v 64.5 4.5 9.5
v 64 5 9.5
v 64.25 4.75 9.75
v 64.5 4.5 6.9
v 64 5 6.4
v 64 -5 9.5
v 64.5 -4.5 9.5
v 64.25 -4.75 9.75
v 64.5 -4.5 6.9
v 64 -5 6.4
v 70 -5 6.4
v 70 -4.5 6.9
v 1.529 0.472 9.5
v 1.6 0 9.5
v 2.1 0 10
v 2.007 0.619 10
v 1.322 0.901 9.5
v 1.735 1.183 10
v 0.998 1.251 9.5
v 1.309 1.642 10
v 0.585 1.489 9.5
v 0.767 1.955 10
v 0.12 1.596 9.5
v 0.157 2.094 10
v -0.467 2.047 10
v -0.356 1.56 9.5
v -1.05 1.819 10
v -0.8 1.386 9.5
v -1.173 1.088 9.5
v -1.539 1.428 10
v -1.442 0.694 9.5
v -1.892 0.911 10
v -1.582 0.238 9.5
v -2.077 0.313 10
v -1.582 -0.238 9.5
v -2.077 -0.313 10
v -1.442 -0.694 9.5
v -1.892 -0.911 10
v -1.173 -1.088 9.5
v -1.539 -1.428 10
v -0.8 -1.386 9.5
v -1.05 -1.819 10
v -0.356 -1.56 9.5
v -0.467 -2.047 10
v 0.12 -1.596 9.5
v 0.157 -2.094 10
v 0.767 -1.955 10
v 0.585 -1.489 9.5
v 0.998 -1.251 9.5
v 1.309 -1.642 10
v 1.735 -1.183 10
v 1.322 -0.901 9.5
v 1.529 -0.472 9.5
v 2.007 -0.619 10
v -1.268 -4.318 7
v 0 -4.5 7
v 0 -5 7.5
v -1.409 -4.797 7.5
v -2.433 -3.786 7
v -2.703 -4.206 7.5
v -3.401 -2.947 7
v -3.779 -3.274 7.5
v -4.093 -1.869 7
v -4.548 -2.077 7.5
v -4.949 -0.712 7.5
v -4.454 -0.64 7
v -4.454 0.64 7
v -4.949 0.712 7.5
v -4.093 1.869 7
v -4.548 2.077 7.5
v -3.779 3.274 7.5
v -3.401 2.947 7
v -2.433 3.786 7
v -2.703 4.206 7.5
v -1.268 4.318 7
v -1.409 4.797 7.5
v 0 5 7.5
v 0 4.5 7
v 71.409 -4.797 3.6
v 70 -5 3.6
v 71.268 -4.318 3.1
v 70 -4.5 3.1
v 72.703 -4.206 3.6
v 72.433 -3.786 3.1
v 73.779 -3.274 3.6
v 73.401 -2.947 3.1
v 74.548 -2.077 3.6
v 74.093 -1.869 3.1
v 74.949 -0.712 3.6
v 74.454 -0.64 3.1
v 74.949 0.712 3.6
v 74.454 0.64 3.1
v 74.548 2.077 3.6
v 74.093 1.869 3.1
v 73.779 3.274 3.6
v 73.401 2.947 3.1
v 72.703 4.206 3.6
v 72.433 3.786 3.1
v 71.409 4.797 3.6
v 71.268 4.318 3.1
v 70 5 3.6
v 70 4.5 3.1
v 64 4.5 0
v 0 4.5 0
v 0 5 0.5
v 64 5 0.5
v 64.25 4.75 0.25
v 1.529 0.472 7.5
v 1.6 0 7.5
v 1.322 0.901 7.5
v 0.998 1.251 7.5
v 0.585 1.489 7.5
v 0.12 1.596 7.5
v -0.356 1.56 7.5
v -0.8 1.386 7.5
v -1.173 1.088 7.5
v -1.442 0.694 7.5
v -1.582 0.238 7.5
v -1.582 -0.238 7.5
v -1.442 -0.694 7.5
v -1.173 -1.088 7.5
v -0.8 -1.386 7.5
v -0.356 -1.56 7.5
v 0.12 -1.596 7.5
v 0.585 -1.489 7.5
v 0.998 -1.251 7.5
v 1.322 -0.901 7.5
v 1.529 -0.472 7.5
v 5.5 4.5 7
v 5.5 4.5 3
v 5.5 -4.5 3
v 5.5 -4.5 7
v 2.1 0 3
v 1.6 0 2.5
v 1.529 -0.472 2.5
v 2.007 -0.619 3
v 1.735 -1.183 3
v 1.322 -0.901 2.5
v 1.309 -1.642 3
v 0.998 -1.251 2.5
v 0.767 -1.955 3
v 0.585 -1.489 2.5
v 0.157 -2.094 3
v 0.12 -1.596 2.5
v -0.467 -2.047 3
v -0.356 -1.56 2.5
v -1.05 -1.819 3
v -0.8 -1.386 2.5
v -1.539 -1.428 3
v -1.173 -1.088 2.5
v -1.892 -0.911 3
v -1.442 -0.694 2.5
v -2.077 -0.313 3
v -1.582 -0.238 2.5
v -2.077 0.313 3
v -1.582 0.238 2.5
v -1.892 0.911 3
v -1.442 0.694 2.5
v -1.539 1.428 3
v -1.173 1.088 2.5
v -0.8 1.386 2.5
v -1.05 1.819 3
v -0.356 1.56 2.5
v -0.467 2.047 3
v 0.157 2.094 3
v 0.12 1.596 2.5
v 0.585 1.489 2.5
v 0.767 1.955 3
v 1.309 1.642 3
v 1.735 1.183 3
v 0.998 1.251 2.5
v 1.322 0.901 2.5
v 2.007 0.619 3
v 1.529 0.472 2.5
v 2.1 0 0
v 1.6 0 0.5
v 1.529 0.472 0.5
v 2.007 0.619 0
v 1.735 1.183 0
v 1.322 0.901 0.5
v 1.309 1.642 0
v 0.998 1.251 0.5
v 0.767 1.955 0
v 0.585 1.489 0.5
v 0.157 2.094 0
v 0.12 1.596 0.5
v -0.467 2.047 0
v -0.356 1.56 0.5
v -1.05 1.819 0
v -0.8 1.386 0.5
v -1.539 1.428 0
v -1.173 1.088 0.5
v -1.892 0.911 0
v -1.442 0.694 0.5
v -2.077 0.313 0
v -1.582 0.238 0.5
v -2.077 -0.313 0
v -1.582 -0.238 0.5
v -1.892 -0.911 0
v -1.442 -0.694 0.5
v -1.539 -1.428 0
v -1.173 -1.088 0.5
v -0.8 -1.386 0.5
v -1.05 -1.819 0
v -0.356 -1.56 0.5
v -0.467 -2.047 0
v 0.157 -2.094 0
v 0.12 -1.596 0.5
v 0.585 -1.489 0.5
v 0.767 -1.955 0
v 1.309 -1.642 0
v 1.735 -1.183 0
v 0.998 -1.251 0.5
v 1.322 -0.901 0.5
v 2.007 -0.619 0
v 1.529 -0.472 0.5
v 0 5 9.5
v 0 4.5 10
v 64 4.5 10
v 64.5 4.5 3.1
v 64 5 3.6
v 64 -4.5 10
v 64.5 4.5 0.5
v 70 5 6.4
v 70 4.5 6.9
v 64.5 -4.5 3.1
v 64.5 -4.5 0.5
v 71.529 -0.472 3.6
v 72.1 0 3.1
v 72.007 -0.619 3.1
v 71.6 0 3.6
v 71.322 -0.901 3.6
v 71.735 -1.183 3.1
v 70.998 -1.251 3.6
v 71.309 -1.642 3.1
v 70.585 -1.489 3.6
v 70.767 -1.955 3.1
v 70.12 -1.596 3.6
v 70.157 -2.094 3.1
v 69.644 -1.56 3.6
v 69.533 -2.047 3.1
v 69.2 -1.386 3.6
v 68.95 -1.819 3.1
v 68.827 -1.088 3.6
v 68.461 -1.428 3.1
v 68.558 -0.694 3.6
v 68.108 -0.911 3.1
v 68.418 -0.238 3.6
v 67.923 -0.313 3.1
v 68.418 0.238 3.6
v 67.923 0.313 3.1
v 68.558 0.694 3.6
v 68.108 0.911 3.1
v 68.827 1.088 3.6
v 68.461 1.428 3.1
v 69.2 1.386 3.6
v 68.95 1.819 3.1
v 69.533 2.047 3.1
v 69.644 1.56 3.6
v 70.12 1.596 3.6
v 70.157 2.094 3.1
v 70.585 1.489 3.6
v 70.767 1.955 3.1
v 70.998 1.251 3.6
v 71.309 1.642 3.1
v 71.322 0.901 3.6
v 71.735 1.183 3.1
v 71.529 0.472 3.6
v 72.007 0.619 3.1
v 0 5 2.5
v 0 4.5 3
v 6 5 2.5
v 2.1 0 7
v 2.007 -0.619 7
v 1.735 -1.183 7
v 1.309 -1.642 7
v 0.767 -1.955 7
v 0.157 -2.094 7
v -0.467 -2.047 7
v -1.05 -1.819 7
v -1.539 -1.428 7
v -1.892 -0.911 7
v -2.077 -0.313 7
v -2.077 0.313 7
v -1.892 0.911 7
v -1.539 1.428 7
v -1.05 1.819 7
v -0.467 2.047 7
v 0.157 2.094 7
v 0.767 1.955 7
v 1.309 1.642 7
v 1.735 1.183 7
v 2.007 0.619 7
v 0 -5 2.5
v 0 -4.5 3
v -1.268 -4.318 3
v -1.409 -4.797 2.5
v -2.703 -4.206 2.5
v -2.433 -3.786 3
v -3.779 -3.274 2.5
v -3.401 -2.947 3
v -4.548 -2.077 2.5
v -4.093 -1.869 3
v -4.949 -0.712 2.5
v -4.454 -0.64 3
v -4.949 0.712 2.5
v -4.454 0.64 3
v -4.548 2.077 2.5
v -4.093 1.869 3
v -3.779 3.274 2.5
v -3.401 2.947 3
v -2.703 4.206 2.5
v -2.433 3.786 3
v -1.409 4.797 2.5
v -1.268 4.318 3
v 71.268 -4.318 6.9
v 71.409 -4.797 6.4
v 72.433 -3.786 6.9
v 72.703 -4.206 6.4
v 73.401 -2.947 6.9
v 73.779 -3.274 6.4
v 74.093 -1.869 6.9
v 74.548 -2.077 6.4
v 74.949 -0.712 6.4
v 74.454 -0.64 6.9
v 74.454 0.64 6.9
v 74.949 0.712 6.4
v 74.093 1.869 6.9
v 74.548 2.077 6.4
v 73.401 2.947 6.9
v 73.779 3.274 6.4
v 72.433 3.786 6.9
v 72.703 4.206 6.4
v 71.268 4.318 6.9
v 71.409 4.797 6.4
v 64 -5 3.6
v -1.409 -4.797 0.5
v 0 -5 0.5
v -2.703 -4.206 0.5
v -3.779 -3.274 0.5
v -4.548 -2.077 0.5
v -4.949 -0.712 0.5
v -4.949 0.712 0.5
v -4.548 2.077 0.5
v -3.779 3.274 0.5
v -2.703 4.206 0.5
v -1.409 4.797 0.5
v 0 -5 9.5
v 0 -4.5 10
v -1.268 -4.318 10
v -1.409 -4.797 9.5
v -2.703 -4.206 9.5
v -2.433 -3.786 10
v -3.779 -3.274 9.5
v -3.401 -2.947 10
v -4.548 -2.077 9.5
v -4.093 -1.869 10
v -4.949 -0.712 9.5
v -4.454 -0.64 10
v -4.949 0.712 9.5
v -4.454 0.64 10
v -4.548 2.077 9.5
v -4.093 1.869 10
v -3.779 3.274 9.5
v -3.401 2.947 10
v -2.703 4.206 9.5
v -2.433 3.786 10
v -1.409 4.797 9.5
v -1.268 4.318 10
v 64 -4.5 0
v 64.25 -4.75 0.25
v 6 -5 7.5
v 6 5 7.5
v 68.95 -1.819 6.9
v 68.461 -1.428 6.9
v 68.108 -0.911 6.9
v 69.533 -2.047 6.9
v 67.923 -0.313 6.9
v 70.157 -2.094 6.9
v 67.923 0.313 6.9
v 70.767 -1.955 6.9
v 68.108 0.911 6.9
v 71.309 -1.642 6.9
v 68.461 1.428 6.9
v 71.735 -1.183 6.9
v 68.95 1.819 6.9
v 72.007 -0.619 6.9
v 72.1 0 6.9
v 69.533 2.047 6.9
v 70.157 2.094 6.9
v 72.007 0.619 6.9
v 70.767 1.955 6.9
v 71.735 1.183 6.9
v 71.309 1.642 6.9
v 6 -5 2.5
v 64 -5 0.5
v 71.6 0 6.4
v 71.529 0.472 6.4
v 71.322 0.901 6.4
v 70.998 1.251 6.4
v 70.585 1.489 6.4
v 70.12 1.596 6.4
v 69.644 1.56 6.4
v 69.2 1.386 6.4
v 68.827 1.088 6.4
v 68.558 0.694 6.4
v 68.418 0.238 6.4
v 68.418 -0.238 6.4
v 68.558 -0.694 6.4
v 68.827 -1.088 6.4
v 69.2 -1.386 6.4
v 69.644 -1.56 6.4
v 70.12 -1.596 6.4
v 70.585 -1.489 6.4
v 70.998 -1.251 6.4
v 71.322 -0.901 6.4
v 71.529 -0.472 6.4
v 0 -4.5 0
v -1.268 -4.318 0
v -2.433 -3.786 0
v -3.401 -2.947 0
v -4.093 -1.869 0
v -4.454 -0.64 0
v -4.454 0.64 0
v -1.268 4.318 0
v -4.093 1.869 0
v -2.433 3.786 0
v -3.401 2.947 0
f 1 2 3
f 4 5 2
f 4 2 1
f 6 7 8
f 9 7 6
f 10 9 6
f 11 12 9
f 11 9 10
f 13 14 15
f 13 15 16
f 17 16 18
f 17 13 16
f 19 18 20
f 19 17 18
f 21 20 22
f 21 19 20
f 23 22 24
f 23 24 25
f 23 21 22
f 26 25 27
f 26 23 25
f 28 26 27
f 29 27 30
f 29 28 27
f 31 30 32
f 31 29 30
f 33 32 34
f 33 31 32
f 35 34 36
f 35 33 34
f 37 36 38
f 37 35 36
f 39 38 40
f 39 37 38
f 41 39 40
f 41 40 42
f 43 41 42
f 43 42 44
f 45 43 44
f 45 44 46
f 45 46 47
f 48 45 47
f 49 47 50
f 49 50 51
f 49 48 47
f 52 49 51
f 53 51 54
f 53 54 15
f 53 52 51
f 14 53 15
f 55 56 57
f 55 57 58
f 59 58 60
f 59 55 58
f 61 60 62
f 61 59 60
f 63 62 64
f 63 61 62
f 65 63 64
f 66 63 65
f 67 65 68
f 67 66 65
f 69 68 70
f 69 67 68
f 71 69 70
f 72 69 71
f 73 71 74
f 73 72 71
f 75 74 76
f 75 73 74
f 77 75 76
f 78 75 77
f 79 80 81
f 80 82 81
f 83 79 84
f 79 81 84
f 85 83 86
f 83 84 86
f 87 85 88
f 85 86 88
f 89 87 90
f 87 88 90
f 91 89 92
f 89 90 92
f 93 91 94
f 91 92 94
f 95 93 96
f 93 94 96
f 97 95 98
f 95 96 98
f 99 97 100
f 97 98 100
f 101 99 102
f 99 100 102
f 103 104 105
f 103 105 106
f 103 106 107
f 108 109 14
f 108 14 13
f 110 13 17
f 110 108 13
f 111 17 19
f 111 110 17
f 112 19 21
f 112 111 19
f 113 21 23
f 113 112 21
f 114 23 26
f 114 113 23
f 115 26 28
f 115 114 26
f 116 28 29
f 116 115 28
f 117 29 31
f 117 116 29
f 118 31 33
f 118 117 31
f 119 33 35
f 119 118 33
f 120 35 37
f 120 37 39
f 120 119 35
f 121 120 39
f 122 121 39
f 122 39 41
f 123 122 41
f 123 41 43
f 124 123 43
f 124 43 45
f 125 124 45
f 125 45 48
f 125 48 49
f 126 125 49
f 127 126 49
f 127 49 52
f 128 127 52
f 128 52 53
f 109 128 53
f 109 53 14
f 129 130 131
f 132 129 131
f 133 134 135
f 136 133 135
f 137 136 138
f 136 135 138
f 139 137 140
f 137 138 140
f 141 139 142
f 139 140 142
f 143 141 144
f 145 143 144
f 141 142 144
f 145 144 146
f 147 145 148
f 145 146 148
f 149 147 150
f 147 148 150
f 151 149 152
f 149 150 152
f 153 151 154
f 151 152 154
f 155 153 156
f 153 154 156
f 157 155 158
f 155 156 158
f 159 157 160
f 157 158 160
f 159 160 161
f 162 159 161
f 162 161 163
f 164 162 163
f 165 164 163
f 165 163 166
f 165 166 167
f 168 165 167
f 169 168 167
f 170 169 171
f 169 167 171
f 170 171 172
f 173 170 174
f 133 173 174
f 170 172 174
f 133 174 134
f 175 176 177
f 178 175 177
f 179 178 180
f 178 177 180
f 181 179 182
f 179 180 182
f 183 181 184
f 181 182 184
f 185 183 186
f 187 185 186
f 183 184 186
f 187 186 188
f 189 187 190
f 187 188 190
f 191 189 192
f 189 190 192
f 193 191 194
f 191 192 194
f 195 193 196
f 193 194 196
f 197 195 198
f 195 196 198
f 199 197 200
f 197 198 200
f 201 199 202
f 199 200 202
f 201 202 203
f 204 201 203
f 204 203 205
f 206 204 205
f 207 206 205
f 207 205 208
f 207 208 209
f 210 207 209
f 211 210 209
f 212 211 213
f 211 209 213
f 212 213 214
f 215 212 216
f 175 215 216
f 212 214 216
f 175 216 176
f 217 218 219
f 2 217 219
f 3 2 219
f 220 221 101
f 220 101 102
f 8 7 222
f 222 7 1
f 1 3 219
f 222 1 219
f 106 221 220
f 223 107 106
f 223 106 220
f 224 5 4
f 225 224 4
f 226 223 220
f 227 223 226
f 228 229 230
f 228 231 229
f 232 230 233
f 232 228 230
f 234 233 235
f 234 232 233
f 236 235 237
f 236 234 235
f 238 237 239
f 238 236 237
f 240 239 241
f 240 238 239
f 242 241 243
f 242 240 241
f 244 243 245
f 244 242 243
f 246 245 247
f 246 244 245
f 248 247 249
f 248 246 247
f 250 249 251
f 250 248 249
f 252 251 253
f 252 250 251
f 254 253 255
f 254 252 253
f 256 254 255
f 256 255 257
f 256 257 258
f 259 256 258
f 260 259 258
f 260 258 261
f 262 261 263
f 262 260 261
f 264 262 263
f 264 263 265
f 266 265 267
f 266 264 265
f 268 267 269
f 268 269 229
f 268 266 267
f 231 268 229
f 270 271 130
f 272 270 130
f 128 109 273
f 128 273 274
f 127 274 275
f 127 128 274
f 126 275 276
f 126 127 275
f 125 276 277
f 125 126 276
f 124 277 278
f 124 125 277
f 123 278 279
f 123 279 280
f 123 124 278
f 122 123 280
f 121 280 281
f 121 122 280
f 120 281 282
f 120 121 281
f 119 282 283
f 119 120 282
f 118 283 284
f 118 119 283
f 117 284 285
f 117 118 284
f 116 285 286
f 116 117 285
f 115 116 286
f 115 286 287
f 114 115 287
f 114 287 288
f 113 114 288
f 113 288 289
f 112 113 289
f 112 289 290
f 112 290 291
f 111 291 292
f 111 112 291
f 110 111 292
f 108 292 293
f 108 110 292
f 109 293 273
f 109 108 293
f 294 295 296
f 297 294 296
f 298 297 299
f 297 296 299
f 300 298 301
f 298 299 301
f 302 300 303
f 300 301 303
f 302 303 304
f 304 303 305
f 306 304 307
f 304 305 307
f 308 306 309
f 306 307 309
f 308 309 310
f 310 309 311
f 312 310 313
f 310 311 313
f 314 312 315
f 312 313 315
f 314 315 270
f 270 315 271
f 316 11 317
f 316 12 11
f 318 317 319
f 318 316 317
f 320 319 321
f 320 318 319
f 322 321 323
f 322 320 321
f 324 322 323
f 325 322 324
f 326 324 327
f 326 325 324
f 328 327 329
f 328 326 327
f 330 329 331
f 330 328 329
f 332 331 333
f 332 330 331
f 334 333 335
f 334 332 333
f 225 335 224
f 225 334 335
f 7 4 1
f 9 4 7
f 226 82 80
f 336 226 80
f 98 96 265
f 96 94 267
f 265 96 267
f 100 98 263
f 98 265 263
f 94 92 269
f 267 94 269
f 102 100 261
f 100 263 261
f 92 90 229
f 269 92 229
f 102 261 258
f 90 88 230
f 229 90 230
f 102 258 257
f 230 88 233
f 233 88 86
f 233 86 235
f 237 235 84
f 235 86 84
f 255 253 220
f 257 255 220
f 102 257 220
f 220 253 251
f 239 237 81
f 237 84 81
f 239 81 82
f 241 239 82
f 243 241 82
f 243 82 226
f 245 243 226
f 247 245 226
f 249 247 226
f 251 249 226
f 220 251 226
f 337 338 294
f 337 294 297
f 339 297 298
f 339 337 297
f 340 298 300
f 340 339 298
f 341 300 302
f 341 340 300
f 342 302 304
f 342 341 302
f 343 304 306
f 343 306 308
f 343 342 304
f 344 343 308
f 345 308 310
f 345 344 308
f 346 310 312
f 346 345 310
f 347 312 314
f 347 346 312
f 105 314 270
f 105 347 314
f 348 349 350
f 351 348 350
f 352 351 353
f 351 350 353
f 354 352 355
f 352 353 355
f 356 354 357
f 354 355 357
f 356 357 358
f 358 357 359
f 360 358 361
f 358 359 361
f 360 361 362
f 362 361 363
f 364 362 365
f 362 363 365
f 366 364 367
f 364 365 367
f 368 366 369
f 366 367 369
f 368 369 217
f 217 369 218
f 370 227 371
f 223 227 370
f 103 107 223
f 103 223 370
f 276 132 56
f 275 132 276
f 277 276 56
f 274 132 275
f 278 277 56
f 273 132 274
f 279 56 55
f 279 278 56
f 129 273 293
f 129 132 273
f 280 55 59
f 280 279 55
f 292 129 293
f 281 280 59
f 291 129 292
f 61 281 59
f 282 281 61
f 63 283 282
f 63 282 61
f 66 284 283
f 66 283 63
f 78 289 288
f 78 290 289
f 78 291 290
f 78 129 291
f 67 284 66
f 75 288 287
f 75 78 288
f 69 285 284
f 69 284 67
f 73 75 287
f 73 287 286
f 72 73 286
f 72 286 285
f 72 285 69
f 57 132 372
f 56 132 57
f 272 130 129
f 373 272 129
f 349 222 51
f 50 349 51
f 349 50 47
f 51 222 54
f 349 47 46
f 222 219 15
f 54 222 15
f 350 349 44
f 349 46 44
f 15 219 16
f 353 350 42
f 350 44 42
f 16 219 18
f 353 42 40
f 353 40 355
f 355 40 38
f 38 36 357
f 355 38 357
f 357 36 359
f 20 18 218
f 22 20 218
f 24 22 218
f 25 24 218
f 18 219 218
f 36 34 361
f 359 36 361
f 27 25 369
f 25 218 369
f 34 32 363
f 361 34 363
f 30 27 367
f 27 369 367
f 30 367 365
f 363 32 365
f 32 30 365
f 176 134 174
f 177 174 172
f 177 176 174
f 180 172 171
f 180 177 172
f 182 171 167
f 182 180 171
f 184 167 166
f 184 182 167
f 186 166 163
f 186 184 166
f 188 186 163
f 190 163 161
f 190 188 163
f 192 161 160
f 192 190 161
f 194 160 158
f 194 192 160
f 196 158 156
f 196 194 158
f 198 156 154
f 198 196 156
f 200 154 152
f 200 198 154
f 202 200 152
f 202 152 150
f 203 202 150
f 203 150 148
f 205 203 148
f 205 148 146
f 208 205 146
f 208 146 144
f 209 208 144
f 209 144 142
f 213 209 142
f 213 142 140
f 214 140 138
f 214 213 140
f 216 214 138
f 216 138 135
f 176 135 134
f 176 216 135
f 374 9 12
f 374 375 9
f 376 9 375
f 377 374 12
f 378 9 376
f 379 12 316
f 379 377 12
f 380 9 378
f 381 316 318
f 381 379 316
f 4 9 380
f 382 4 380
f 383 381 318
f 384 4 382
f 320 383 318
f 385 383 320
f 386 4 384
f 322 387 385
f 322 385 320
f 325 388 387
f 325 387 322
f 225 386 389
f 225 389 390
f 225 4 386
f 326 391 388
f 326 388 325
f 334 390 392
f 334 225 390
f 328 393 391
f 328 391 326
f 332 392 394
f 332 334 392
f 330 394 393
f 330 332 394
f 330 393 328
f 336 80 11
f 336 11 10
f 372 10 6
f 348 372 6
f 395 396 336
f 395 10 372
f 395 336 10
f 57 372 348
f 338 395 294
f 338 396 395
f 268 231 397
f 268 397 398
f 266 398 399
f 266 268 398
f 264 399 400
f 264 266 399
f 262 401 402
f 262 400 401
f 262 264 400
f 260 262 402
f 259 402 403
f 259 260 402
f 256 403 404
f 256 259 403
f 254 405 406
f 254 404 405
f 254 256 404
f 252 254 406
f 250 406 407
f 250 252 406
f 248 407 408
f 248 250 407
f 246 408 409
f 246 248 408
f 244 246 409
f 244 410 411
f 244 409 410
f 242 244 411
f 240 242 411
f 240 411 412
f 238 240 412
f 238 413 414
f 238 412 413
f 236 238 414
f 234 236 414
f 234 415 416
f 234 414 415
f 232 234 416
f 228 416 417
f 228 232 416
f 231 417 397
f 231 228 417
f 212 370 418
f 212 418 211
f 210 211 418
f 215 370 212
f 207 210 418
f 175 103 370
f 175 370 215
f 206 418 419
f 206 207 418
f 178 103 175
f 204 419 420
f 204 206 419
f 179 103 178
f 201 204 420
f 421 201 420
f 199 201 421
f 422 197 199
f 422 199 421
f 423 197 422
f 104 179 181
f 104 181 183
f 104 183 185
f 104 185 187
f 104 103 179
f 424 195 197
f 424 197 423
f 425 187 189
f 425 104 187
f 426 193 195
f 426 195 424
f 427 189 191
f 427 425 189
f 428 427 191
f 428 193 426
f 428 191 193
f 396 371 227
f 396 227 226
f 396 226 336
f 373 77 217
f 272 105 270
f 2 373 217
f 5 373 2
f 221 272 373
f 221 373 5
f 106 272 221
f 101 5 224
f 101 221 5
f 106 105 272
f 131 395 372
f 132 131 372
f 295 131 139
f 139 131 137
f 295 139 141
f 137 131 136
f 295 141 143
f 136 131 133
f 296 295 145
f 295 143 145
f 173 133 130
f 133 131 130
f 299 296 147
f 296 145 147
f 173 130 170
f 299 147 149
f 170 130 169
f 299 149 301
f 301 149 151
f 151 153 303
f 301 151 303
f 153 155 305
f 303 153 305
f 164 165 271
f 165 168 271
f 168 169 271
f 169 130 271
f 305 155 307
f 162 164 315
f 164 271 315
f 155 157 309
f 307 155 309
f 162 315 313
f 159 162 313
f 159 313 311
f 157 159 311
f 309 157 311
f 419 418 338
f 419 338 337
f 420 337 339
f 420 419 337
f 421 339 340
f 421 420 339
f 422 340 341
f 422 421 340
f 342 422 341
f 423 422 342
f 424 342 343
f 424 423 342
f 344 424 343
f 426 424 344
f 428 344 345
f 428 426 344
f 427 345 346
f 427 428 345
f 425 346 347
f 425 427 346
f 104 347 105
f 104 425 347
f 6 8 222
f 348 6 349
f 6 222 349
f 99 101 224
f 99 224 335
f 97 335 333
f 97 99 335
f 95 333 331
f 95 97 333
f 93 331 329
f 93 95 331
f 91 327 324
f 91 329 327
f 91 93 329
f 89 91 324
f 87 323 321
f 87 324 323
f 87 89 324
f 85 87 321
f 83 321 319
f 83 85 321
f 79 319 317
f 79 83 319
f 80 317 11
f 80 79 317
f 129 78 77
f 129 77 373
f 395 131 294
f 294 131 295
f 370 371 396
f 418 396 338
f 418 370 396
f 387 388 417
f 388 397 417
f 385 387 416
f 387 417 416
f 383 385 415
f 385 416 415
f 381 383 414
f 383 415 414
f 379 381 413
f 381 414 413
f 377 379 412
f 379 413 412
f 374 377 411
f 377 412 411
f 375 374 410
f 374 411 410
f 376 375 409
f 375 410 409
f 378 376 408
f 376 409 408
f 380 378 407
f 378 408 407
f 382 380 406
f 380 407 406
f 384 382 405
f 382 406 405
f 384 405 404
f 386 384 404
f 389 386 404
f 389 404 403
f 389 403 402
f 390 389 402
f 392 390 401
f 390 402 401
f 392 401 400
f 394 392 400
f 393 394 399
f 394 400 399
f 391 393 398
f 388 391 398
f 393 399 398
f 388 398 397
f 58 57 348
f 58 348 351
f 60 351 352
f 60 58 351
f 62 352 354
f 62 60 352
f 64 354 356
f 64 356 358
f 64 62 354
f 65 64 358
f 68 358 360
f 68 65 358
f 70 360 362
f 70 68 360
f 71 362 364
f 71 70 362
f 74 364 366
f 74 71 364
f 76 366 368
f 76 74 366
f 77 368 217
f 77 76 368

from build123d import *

# Parameters (mm, degrees)
SKETCH1_R           = 1.6
BOSS_EXTRUDE1_DEPTH = 10
CUT_EXTRUDE1_START  = -7
CUT_EXTRUDE1_DEPTH  = 4
CHAMFER1_SIZE       = 0.5
CUT_EXTRUDE2_START  = -3.1
CUT_EXTRUDE2_DEPTH  = 3.1
CUT_EXTRUDE3_START  = -6.9
CUT_EXTRUDE3_DEPTH  = 3.1
CHAMFER2_SIZE       = 0.5


with BuildPart() as part:
    # Sketch1 → Boss-Extrude1 (new body)
    with BuildSketch(Plane.XY):
        with BuildLine():
            Line((0, 5), (70, 5))
            ThreePointArc((70, 5), (75, 0), (70, -5))
            Line((70, -5), (0, -5))
            ThreePointArc((0, -5), (-5, 0), (0, 5))
        make_face()
        Circle(SKETCH1_R, mode=Mode.SUBTRACT)
        with Locations((70, 0)):
            Circle(SKETCH1_R, mode=Mode.SUBTRACT)
    extrude(amount=BOSS_EXTRUDE1_DEPTH)

    # Sketch2 → Cut-Extrude1 (cut)
    with BuildSketch(Plane.XY.offset(10).offset(CUT_EXTRUDE1_START)):
        with BuildLine():
            Line((5.5, 5), (5.5, -5))
            Line((5.5, -5), (0, -5))
            ThreePointArc((0, -5), (-5, 0), (0, 5))
            Line((0, 5), (5.5, 5))
        make_face()
    extrude(amount=CUT_EXTRUDE1_DEPTH, mode=Mode.SUBTRACT)

    # Chamfer1
    chamfer1_edges = [part.edges().sort_by_distance(p)[0] for p in [
        (75, 0, 10),
        (-1.6, 0, 0),
        (-1.6, 0, 10),
        (35, 5, 10),
        (68.4, 0, 0),
        (68.4, 0, 10),
        (-1.6, 0, 3),
        (2.75, 5, 3),
        (5.5, 5, 5),
        (2.75, -5, 3),
        (5.5, -5, 5),
        (-5, 0, 3),
        (-1.6, 0, 7),
        (2.75, 5, 7),
        (-5, 0, 7),
        (2.75, -5, 7),
        (-5, 0, 10),
        (35, 5, 0),
        (75, 0, 0),
        (35, -5, 0),
        (-5, 0, 0),
        (35, -5, 10),
    ]]
    chamfer(chamfer1_edges, length=CHAMFER1_SIZE)

    # Sketch3 → Cut-Extrude2 (cut)
    with BuildSketch(Plane.XY.offset(10).offset(CUT_EXTRUDE2_START)):
        with BuildLine():
            Line((64.5, 5), (64.5, -5))
            Line((64.5, -5), (70, -5))
            ThreePointArc((70, -5), (75, 0), (70, 5))
            Line((70, 5), (64.5, 5))
        make_face()
    extrude(amount=CUT_EXTRUDE2_DEPTH, mode=Mode.SUBTRACT)

    # Sketch4 → Cut-Extrude3 (cut)
    with BuildSketch(Plane.XY.offset(6.9).offset(CUT_EXTRUDE3_START)):
        with BuildLine():
            Line((64.5, 5), (64.5, -5))
            Line((64.5, -5), (70, -5))
            ThreePointArc((70, -5), (75, 0), (70, 5))
            Line((70, 5), (64.5, 5))
        make_face()
    extrude(amount=CUT_EXTRUDE3_DEPTH, mode=Mode.SUBTRACT)

    # Chamfer2
    # the kernel refuses this chamfer: 0.5 mm, written as the material it takes off along each edge
    with BuildSketch(Plane(origin=(70, 0, 6.9), x_dir=(1, 0, 0), z_dir=(0, 1, 0))) as chamfer2_piece_1:
        Polygon((1.6 + CHAMFER2_SIZE, 0), (1.6, CHAMFER2_SIZE), (1.6, 0), align=None)
    revolve(axis=Axis((70, 0, 6.9), (0, 0, -1)), mode=Mode.SUBTRACT)
    with BuildSketch(Plane(origin=(70, 0, 3.1), x_dir=(1, 0, 0), z_dir=(0, 1, 0))) as chamfer2_piece_2:
        Polygon((1.6 + CHAMFER2_SIZE, 0), (1.6, -CHAMFER2_SIZE), (1.6, 0), align=None)
    revolve(axis=Axis((70, 0, 3.1), (0, 0, -1)), mode=Mode.SUBTRACT)
    with BuildSketch(Plane(origin=(64.5, -5, -0.785841494), x_dir=(0.0274958766105822, 0.999621916911297, 0), z_dir=(0, 0, 1)), Plane(origin=(64.5, 5, -0.785841494), x_dir=(-0.9996219169112968, 0.02749587661058574, 0), z_dir=(0, 0, 1)), Plane(origin=(64.5, -5, 6.9), x_dir=(0.0274958766105822, 0.999621916911297, 0), z_dir=(0, 0, 1)), Plane(origin=(64.5, 5, 6.9), x_dir=(-0.9996219169112973, 0.027495876610566763, 0), z_dir=(0, 0, 1))) as chamfer2_piece_3:
        Polygon((CHAMFER2_SIZE * 0.999621916911, CHAMFER2_SIZE * 0.0274958766106), (-CHAMFER2_SIZE * 0.0274958766106, CHAMFER2_SIZE * 0.999621916911), (0, 0), align=None)
    extrude(amount=3.885841494, mode=Mode.SUBTRACT)
    with BuildSketch(Plane(origin=(64.5, 5.785841494, 0), x_dir=(0.027495876610582174, 0, 0.9996219169112968), z_dir=(0, -1, 0))) as chamfer2_piece_4:
        Polygon((CHAMFER2_SIZE * 0.999621916911, CHAMFER2_SIZE * 0.0274958766106), (-CHAMFER2_SIZE * 0.0274958766106, CHAMFER2_SIZE * 0.999621916911), (0, 0), align=None)
    extrude(amount=11.571682988, mode=Mode.SUBTRACT)
    with BuildSketch(Plane(origin=(64.5, -5, 3.1), x_dir=(0, 0.9996219169112968, -0.027495876610586462), z_dir=(1, 0, 0)), Plane(origin=(70, 5, 6.9), x_dir=(0, 0.027495876610585647, -0.9996219169112968), z_dir=(-1, 0, 0))) as chamfer2_piece_5:
        Polygon((CHAMFER2_SIZE * 0.999621916911, CHAMFER2_SIZE * 0.0274958766106), (-CHAMFER2_SIZE * 0.0274958766106, CHAMFER2_SIZE * 0.999621916911), (0, 0), align=None)
    extrude(amount=5.5, mode=Mode.SUBTRACT)
    with BuildSketch(Plane(origin=(70, 0, 3.1), x_dir=(0, -1, 0), z_dir=(-1, 0, 0))) as chamfer2_piece_6:
        Polygon((5, CHAMFER2_SIZE), (5 - CHAMFER2_SIZE, 0), (5, 0), align=None)
    revolve(axis=Axis((70, 0, 3.1), (0, 0, 1)), revolution_arc=180, mode=Mode.SUBTRACT)
    with BuildSketch(Plane(origin=(70, 5, 3.1), x_dir=(0, 0.027495876610585623, 0.9996219169112968), z_dir=(-1, 0, 0)), Plane(origin=(64.5, -5, 6.9), x_dir=(0, 0.9996219169112968, 0.0274958766105856), z_dir=(1, 0, 0))) as chamfer2_piece_7:
        Polygon((CHAMFER2_SIZE * 0.999621916911, -CHAMFER2_SIZE * 0.0274958766106), (-CHAMFER2_SIZE * 0.0274958766106, -CHAMFER2_SIZE * 0.999621916911), (0, 0), align=None)
    extrude(amount=5.5, mode=Mode.SUBTRACT)
    with BuildSketch(Plane(origin=(64.5, 5.785841494, 10), x_dir=(0.0274958766105822, 0, -0.999621916911297), z_dir=(0, -1, 0))) as chamfer2_piece_8:
        Polygon((CHAMFER2_SIZE * 0.999621916911, -CHAMFER2_SIZE * 0.0274958766106), (-CHAMFER2_SIZE * 0.0274958766106, -CHAMFER2_SIZE * 0.999621916911), (0, 0), align=None)
    extrude(amount=11.571682988, mode=Mode.SUBTRACT)
    with BuildSketch(Plane(origin=(70, 0, 6.9), x_dir=(0, -1, 0), z_dir=(-1, 0, 0))) as chamfer2_piece_9:
        Polygon((5, -CHAMFER2_SIZE), (5 - CHAMFER2_SIZE, 0), (5, 0), align=None)
    revolve(axis=Axis((70, 0, 6.9), (0, 0, 1)), revolution_arc=180, mode=Mode.SUBTRACT)
    with BuildSketch(Plane(origin=(64.5, -5, -0.785841494), x_dir=(0.0274958766105822, 0.999621916911297, 0), z_dir=(0, 0, 1))) as chamfer2_piece_10a_section:
        Polygon((CHAMFER2_SIZE * 0.999621916911, CHAMFER2_SIZE * 0.0274958766106), (-CHAMFER2_SIZE * 0.0274958766106, CHAMFER2_SIZE * 0.999621916911), (0, 0), align=None)
    chamfer2_piece_10a = extrude(amount=5.171682988, mode=Mode.PRIVATE)
    chamfer2_piece_10a = split(chamfer2_piece_10a, bisect_by=Plane(origin=(64.335103187, -4.835103187, 3.1), z_dir=(0, 0, 1)), keep=Keep.TOP, mode=Mode.PRIVATE)
    with BuildSketch(Plane(origin=(63.214158506, -5, 3.1), x_dir=(0, 0.9996219169112968, -0.02749587661058651), z_dir=(1, 0, 0))) as chamfer2_piece_10b_section:
        Polygon((CHAMFER2_SIZE * 0.999621916911, CHAMFER2_SIZE * 0.0274958766106), (-CHAMFER2_SIZE * 0.0274958766106, CHAMFER2_SIZE * 0.999621916911), (0, 0), align=None)
    chamfer2_piece_10b = extrude(amount=6.785841494, mode=Mode.PRIVATE)
    chamfer2_piece_10b = split(chamfer2_piece_10b, bisect_by=Plane(origin=(64.5, -4.835103187, 3.264896813), z_dir=(-1, 0, 0)), keep=Keep.TOP, mode=Mode.PRIVATE)
    chamfer2_piece_10 = chamfer2_piece_10a & chamfer2_piece_10b
    add(chamfer2_piece_10, mode=Mode.SUBTRACT)
    with BuildSketch(Plane(origin=(64.5, 5, -0.785841494), x_dir=(-0.9996219169112968, 0.02749587661058574, 0), z_dir=(0, 0, 1))) as chamfer2_piece_11a_section:
        Polygon((CHAMFER2_SIZE * 0.999621916911, CHAMFER2_SIZE * 0.0274958766106), (-CHAMFER2_SIZE * 0.0274958766106, CHAMFER2_SIZE * 0.999621916911), (0, 0), align=None)
    chamfer2_piece_11a = extrude(amount=5.171682988, mode=Mode.PRIVATE)
    chamfer2_piece_11a = split(chamfer2_piece_11a, bisect_by=Plane(origin=(64.335103187, 4.835103187, 3.1), z_dir=(0, 0, 1)), keep=Keep.TOP, mode=Mode.PRIVATE)
    with BuildSketch(Plane(origin=(70, 5, 3.1), x_dir=(0, 0.027495876610585623, 0.9996219169112968), z_dir=(-1, 0, 0))) as chamfer2_piece_11b_section:
        Polygon((CHAMFER2_SIZE * 0.999621916911, -CHAMFER2_SIZE * 0.0274958766106), (-CHAMFER2_SIZE * 0.0274958766106, -CHAMFER2_SIZE * 0.999621916911), (0, 0), align=None)
    chamfer2_piece_11b = extrude(amount=6.785841494, mode=Mode.PRIVATE)
    chamfer2_piece_11b = split(chamfer2_piece_11b, bisect_by=Plane(origin=(64.5, 4.835103187, 3.264896813), z_dir=(-1, 0, 0)), keep=Keep.TOP, mode=Mode.PRIVATE)
    chamfer2_piece_11 = chamfer2_piece_11a & chamfer2_piece_11b
    add(chamfer2_piece_11, mode=Mode.SUBTRACT)
    with BuildSketch(Plane(origin=(63.214158506, -5, 6.9), x_dir=(0, 0.9996219169112968, 0.027495876610585647), z_dir=(1, 0, 0))) as chamfer2_piece_12a_section:
        Polygon((CHAMFER2_SIZE * 0.999621916911, -CHAMFER2_SIZE * 0.0274958766106), (-CHAMFER2_SIZE * 0.0274958766106, -CHAMFER2_SIZE * 0.999621916911), (0, 0), align=None)
    chamfer2_piece_12a = extrude(amount=6.785841494, mode=Mode.PRIVATE)
    chamfer2_piece_12a = split(chamfer2_piece_12a, bisect_by=Plane(origin=(64.5, -4.835103187, 6.735103187), z_dir=(-1, 0, 0)), keep=Keep.TOP, mode=Mode.PRIVATE)
    with BuildSketch(Plane(origin=(64.5, -5, 5.614158506), x_dir=(0.0274958766105822, 0.999621916911297, 0), z_dir=(0, 0, 1))) as chamfer2_piece_12b_section:
        Polygon((CHAMFER2_SIZE * 0.999621916911, CHAMFER2_SIZE * 0.0274958766106), (-CHAMFER2_SIZE * 0.0274958766106, CHAMFER2_SIZE * 0.999621916911), (0, 0), align=None)
    chamfer2_piece_12b = extrude(amount=5.171682988, mode=Mode.PRIVATE)
    chamfer2_piece_12b = split(chamfer2_piece_12b, bisect_by=Plane(origin=(64.335103187, -4.835103187, 6.9), z_dir=(0, 0, -1)), keep=Keep.TOP, mode=Mode.PRIVATE)
    chamfer2_piece_12 = chamfer2_piece_12a & chamfer2_piece_12b
    add(chamfer2_piece_12, mode=Mode.SUBTRACT)
    with BuildSketch(Plane(origin=(70, 5, 6.9), x_dir=(0, 0.027495876610585647, -0.9996219169112968), z_dir=(-1, 0, 0))) as chamfer2_piece_13a_section:
        Polygon((CHAMFER2_SIZE * 0.999621916911, CHAMFER2_SIZE * 0.0274958766106), (-CHAMFER2_SIZE * 0.0274958766106, CHAMFER2_SIZE * 0.999621916911), (0, 0), align=None)
    chamfer2_piece_13a = extrude(amount=6.785841494, mode=Mode.PRIVATE)
    chamfer2_piece_13a = split(chamfer2_piece_13a, bisect_by=Plane(origin=(64.5, 4.835103187, 6.735103187), z_dir=(-1, 0, 0)), keep=Keep.TOP, mode=Mode.PRIVATE)
    with BuildSketch(Plane(origin=(64.5, 5, 5.614158506), x_dir=(-0.9996219169112968, 0.02749587661058574, 0), z_dir=(0, 0, 1))) as chamfer2_piece_13b_section:
        Polygon((CHAMFER2_SIZE * 0.999621916911, CHAMFER2_SIZE * 0.0274958766106), (-CHAMFER2_SIZE * 0.0274958766106, CHAMFER2_SIZE * 0.999621916911), (0, 0), align=None)
    chamfer2_piece_13b = extrude(amount=5.171682988, mode=Mode.PRIVATE)
    chamfer2_piece_13b = split(chamfer2_piece_13b, bisect_by=Plane(origin=(64.335103187, 4.835103187, 6.9), z_dir=(0, 0, -1)), keep=Keep.TOP, mode=Mode.PRIVATE)
    chamfer2_piece_13 = chamfer2_piece_13a & chamfer2_piece_13b
    add(chamfer2_piece_13, mode=Mode.SUBTRACT)


solid = part.part
